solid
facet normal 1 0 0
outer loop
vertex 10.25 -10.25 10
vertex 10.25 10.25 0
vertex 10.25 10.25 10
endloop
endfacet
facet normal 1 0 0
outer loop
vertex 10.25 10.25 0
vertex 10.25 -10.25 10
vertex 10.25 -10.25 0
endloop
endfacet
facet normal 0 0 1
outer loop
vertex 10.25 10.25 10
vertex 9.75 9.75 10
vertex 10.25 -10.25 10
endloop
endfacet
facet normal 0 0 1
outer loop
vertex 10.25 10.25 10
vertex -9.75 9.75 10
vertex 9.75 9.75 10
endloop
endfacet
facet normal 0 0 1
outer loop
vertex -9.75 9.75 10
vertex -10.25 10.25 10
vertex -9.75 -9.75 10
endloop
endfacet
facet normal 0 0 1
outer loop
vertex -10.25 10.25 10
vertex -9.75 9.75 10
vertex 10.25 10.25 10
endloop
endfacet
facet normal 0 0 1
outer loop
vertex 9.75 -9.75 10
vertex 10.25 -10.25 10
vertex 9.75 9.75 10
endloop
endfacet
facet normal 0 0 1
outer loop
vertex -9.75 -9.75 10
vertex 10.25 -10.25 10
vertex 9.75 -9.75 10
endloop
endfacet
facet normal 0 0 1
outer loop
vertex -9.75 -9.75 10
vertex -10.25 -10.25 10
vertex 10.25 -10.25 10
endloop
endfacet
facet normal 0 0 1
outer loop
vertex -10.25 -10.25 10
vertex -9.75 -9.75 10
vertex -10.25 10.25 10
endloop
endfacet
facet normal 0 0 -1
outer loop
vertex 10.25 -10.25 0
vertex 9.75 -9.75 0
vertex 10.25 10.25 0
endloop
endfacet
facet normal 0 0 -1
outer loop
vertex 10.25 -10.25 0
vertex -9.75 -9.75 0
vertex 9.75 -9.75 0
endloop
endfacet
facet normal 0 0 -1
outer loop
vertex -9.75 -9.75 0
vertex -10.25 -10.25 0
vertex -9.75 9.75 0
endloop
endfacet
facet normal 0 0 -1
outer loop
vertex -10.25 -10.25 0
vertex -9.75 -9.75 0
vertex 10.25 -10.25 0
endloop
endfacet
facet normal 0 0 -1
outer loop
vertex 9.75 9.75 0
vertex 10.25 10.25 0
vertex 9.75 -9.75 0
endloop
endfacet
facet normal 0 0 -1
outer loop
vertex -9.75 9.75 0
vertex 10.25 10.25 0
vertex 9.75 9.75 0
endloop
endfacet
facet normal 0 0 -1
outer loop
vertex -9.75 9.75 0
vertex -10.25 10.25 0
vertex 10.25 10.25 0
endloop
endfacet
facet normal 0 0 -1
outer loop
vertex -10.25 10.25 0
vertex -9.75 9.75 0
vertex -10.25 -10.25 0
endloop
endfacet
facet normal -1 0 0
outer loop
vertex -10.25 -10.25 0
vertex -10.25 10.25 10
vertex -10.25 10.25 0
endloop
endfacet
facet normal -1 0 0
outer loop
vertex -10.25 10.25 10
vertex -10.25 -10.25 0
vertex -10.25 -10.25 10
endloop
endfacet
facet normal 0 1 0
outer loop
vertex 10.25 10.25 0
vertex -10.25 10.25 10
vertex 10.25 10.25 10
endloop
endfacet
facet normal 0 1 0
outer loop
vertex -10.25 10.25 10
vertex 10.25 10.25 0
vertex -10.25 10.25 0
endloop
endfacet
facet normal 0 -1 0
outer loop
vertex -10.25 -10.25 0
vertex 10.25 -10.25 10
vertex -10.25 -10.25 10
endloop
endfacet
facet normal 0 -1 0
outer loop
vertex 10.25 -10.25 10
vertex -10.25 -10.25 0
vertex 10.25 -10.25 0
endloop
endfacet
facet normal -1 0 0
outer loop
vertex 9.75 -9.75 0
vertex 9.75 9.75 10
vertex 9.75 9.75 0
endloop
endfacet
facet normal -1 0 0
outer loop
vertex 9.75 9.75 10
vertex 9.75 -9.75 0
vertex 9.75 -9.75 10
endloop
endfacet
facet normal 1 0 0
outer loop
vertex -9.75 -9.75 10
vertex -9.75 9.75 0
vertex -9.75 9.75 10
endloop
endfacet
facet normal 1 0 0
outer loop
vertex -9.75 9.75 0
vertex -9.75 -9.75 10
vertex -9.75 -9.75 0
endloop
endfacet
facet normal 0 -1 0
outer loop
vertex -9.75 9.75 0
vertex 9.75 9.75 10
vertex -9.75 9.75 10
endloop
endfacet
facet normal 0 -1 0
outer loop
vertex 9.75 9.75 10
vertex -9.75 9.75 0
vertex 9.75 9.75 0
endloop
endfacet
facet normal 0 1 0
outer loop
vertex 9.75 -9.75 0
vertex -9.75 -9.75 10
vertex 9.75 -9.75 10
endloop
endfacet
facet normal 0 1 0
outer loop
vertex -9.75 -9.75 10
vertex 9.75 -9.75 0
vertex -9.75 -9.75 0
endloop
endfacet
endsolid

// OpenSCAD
// 0,5mm thin wall cube or cylinder
length = 20;
width = 20;
height = 10;
thickness = 0.5;
cubes = true; // true = cube; false = cylinder

module thin_wall_object(l,w,h,t) {
	translate([0,0,h/2])
	if (cubes) {
		difference() {
			cube([l+t,w+t,h],true);
			cube([l-t,w-t,h+1],true);	
		}
	} else {
		difference() {
			cylinder(r=length/2+t/2,h=h,center=true);
			cylinder(r=length/2-t/2,h=h+1,center=true);
		}
	}
}

thin_wall_object(length,width,height,thickness);


// debug code for testing, how slicing software treats different wall thickness
//he = 0.3;
//woh = 2.3;
//wi = he*woh;
//
//for (i=[ [-2,      1.5, 0.1*wi],		
//		 [-0.75,  1.5, 0.5*wi],
//		 [0.75,   1.5, 1.0*wi],
//		 [2,      1.5, 1.5*wi],
//		 [-2,    -1.5, 2.0*wi],
//		 [-0.75, -1.5, 2.4*wi],
//		 [0.75,  -1.5, 2.5*wi],
//		 [2,     -1.5, 2.6*wi],
//		 [-2,    -3,   3.5*wi],
//		 [-0.75, -3,   3.8*wi],
//		 [0.75,  -3,   3.9*wi],
//		 [2,     -3,   4.0*wi]
//       ]) {
//	translate([i[0]*length,i[1]*width,0]) thin_wall_object(length,width,height,i[2]);
//}
